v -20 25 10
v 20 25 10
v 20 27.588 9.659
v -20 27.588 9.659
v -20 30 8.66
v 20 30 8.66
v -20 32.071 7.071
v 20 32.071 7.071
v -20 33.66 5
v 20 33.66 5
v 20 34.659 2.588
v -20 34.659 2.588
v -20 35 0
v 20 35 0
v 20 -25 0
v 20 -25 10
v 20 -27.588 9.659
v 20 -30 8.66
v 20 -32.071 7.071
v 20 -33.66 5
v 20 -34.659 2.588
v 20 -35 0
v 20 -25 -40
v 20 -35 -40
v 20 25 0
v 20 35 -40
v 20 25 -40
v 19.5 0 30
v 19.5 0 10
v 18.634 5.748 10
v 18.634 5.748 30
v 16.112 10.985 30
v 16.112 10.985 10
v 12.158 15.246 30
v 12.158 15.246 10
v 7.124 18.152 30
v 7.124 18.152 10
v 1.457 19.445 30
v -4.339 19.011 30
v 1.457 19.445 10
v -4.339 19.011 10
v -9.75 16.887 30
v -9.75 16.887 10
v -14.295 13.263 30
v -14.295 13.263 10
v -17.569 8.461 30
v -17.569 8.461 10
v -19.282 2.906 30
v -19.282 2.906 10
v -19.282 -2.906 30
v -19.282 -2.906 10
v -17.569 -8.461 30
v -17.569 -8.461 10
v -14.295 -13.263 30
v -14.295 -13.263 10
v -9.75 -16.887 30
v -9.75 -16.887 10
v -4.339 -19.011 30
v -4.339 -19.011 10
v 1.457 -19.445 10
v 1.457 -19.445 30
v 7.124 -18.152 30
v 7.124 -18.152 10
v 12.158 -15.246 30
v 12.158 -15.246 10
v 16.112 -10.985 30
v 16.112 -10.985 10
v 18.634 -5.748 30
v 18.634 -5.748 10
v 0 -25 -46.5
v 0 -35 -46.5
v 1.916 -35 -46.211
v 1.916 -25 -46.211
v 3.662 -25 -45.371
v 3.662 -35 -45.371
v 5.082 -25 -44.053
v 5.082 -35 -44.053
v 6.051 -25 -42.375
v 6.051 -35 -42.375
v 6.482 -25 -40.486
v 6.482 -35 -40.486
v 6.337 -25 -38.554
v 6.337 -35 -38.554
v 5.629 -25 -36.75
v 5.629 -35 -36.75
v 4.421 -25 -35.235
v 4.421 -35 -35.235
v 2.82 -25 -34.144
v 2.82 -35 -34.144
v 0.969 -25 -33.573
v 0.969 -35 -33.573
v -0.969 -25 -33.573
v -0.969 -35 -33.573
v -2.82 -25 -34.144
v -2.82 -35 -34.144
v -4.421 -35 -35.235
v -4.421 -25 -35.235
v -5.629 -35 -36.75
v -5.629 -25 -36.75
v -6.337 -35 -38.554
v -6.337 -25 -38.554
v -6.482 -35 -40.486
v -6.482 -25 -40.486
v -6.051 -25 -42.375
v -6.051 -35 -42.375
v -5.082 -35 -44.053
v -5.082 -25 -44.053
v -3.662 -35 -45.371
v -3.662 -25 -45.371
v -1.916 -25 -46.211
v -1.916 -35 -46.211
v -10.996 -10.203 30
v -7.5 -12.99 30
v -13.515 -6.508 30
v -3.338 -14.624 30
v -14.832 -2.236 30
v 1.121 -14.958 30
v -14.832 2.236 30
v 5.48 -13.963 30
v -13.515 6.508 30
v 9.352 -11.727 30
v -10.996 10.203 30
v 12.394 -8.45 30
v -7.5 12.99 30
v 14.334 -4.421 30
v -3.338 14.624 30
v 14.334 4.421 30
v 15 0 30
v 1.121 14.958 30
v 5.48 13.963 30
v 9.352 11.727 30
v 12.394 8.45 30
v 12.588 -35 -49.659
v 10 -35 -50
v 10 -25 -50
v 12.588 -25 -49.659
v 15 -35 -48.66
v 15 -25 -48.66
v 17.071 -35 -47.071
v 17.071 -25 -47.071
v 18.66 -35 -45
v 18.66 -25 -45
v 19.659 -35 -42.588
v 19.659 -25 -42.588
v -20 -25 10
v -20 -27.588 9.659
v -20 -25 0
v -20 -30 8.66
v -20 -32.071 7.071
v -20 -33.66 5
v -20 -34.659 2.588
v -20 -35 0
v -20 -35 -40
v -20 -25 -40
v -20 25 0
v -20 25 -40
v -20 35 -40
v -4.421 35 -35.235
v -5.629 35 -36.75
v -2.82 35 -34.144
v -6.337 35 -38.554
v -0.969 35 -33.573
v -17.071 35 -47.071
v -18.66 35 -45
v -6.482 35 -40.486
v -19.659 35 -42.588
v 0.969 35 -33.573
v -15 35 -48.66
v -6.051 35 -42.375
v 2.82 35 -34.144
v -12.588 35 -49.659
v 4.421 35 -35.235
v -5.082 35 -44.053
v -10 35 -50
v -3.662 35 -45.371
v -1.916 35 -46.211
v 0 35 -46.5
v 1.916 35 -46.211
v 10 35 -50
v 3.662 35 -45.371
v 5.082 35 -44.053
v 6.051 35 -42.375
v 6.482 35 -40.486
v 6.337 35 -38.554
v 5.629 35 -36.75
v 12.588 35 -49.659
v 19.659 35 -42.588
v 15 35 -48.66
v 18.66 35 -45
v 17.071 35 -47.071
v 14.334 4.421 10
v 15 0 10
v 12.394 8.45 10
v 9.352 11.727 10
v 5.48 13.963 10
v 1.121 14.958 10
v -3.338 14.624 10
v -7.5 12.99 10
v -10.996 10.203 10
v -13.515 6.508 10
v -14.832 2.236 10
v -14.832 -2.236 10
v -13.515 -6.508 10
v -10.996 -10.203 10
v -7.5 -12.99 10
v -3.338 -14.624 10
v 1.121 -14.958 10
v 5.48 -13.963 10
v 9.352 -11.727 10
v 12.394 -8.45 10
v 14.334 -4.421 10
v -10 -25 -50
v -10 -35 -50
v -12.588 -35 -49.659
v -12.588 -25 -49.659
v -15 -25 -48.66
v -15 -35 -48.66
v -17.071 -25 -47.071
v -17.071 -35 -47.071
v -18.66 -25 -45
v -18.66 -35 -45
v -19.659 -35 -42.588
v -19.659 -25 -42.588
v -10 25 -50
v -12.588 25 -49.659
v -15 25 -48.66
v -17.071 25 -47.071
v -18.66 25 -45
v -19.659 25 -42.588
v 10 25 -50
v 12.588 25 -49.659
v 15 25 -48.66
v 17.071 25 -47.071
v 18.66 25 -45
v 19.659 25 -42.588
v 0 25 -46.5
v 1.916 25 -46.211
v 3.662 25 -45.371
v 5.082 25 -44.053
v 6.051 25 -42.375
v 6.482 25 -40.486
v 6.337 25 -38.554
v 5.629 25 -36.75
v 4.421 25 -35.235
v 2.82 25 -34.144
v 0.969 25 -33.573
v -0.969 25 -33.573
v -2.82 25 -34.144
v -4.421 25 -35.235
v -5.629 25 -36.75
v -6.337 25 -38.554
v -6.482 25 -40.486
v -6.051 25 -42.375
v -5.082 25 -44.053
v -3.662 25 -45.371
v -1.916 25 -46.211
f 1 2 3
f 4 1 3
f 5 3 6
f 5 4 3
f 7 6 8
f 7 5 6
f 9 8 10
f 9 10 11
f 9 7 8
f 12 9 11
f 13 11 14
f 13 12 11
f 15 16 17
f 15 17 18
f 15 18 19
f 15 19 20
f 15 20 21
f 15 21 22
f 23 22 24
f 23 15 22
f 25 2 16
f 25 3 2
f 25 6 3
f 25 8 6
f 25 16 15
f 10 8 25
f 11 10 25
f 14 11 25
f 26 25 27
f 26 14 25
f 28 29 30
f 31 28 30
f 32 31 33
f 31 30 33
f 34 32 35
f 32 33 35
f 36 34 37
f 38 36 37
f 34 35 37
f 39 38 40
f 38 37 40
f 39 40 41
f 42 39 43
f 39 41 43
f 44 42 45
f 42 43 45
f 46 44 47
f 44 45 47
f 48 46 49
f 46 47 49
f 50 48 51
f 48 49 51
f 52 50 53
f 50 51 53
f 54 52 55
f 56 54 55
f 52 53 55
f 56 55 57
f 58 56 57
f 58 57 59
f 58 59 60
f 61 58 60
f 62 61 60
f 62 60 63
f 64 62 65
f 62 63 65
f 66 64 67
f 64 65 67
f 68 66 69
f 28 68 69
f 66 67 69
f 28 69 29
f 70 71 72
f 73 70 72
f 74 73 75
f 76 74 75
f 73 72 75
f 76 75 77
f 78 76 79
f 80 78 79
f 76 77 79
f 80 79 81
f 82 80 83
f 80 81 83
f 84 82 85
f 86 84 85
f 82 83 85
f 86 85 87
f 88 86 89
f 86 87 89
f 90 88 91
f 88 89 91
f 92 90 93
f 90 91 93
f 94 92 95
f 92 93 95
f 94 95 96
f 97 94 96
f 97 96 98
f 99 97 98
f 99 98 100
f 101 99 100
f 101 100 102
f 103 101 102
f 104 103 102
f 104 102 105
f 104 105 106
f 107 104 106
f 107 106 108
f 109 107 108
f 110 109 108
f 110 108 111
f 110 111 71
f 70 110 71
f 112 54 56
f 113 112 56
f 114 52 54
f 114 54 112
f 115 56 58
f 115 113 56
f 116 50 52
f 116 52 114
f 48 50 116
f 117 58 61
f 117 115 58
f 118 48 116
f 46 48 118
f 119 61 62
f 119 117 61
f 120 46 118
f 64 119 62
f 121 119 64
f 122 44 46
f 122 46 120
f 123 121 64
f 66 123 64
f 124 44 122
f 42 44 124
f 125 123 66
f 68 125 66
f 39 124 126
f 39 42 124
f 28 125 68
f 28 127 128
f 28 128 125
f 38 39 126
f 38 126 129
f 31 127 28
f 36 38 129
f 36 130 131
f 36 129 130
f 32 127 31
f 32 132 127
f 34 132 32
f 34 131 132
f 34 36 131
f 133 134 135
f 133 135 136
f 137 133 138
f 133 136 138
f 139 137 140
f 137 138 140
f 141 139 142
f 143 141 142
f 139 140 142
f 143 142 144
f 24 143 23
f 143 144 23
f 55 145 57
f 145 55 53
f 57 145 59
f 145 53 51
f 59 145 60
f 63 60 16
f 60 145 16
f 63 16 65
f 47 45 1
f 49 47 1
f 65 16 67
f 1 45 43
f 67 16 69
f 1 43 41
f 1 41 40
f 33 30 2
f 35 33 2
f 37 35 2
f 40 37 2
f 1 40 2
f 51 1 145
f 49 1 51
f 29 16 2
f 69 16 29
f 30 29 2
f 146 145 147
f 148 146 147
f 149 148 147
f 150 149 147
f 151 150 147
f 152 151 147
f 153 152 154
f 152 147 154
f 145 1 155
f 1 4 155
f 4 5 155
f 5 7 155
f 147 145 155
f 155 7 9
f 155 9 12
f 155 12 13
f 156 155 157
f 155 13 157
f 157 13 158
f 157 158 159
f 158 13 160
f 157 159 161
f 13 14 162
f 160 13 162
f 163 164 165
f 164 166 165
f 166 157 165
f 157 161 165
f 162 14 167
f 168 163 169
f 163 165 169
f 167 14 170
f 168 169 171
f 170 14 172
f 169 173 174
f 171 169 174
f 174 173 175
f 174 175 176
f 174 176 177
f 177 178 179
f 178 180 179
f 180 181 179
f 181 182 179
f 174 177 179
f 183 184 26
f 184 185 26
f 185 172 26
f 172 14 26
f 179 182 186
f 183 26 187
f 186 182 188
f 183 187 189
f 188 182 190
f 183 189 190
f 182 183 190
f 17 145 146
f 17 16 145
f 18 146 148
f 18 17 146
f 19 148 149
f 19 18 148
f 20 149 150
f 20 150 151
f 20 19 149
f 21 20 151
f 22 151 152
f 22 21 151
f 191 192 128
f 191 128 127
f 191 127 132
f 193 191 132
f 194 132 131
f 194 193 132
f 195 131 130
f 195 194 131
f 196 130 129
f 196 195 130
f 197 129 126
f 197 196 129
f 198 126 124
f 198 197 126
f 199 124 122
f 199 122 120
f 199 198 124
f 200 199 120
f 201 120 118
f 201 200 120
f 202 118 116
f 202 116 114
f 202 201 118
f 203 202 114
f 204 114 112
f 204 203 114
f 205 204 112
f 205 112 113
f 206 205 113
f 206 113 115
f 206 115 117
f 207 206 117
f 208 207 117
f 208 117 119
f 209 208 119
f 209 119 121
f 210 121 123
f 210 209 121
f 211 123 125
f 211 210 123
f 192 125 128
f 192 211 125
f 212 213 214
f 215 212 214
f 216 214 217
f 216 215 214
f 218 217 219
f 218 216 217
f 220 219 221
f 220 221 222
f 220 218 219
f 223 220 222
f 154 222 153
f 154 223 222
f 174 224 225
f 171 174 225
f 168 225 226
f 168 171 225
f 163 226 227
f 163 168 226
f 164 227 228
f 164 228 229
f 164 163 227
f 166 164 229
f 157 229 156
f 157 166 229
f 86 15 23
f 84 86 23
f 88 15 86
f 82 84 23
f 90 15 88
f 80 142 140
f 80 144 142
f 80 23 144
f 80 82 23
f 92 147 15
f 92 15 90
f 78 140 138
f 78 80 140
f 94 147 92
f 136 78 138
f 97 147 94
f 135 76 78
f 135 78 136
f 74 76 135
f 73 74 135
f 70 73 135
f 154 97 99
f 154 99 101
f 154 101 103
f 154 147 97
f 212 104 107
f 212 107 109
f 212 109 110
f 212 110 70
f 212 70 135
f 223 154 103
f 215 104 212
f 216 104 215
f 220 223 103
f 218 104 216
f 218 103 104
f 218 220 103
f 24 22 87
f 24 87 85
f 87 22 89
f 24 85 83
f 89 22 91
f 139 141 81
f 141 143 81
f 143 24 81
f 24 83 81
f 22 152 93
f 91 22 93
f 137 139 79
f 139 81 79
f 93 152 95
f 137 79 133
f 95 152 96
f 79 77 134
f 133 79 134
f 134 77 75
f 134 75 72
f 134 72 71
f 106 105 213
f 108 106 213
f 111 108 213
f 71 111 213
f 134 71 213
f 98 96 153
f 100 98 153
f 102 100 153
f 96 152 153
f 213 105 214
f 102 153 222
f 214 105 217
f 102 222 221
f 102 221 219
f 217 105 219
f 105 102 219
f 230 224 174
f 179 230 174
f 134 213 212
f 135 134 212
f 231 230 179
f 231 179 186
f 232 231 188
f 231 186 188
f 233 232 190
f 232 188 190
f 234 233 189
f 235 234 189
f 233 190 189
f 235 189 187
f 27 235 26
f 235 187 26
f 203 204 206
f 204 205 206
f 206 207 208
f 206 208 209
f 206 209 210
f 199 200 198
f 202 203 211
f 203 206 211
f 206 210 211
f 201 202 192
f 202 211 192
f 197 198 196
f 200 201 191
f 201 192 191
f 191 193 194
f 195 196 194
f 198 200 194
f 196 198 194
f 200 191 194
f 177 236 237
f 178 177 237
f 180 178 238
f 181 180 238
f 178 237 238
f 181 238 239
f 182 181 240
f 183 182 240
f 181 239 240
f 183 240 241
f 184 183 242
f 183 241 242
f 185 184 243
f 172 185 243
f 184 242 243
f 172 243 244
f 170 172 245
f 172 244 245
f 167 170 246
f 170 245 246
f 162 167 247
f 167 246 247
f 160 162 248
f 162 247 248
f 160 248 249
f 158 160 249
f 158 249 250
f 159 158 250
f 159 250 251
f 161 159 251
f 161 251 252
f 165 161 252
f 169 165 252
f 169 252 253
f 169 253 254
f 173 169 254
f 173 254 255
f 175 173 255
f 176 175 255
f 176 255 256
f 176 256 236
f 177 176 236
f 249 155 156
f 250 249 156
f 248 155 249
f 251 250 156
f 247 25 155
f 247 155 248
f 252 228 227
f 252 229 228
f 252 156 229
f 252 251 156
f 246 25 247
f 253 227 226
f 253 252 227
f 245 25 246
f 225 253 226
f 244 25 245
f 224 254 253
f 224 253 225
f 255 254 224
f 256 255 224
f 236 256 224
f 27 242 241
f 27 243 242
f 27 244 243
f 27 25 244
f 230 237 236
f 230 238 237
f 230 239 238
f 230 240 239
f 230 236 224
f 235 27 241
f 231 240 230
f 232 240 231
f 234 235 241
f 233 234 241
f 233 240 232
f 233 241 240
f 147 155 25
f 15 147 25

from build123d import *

# Parameters (mm, degrees)
SKETCH1_W           = 40
SKETCH1_H           = 50
BOSS_EXTRUDE1_DEPTH = 10
SKETCH3_W           = 60
SKETCH3_H           = 10
BOSS_EXTRUDE2_DEPTH = 20
FILLET1_R           = 10
SKETCH4_R           = 19.5
SKETCH4_R_2         = 15
BOSS_EXTRUDE3_DEPTH = 20
SKETCH5_R           = 6.5
CUT_EXTRUDE1_DEPTH  = 100


with BuildPart() as part:
    # Sketch1 → Boss-Extrude1 (new body)
    with BuildSketch(Plane.XY):
        Rectangle(SKETCH1_W, SKETCH1_H)
    extrude(amount=BOSS_EXTRUDE1_DEPTH)

    # Sketch3 → Boss-Extrude2 (add, symmetric)
    with BuildSketch(Plane(origin=(0, 0, 0), x_dir=(0, 0, -1), z_dir=(1, 0, 0))):
        with Locations((20, -30)):
            Rectangle(SKETCH3_W, SKETCH3_H)
        with Locations((20, 30)):
            Rectangle(SKETCH3_W, SKETCH3_H)
    extrude(amount=BOSS_EXTRUDE2_DEPTH, both=True)

    # Fillet1
    fillet1_edges = [part.edges().sort_by_distance(p)[0] for p in [
        (0, -35, 10),
        (-20, -30, -50),
        (20, -30, -50),
        (0, 35, 10),
        (-20, 30, -50),
        (20, 30, -50),
    ]]
    fillet(fillet1_edges, radius=FILLET1_R)

    # Sketch4 → Boss-Extrude3 (add)
    with BuildSketch(Plane.XY.offset(10)):
        Circle(SKETCH4_R)
        Circle(SKETCH4_R_2, mode=Mode.SUBTRACT)
    extrude(amount=BOSS_EXTRUDE3_DEPTH)

    # Sketch5 → Cut-Extrude1 (cut)
    with BuildSketch(Plane.XZ.offset(35)):
        with Locations(Location((0, -40, 0), (0, 0, 270))):
            Circle(SKETCH5_R)
    extrude(amount=-CUT_EXTRUDE1_DEPTH, mode=Mode.SUBTRACT)


solid = part.part
